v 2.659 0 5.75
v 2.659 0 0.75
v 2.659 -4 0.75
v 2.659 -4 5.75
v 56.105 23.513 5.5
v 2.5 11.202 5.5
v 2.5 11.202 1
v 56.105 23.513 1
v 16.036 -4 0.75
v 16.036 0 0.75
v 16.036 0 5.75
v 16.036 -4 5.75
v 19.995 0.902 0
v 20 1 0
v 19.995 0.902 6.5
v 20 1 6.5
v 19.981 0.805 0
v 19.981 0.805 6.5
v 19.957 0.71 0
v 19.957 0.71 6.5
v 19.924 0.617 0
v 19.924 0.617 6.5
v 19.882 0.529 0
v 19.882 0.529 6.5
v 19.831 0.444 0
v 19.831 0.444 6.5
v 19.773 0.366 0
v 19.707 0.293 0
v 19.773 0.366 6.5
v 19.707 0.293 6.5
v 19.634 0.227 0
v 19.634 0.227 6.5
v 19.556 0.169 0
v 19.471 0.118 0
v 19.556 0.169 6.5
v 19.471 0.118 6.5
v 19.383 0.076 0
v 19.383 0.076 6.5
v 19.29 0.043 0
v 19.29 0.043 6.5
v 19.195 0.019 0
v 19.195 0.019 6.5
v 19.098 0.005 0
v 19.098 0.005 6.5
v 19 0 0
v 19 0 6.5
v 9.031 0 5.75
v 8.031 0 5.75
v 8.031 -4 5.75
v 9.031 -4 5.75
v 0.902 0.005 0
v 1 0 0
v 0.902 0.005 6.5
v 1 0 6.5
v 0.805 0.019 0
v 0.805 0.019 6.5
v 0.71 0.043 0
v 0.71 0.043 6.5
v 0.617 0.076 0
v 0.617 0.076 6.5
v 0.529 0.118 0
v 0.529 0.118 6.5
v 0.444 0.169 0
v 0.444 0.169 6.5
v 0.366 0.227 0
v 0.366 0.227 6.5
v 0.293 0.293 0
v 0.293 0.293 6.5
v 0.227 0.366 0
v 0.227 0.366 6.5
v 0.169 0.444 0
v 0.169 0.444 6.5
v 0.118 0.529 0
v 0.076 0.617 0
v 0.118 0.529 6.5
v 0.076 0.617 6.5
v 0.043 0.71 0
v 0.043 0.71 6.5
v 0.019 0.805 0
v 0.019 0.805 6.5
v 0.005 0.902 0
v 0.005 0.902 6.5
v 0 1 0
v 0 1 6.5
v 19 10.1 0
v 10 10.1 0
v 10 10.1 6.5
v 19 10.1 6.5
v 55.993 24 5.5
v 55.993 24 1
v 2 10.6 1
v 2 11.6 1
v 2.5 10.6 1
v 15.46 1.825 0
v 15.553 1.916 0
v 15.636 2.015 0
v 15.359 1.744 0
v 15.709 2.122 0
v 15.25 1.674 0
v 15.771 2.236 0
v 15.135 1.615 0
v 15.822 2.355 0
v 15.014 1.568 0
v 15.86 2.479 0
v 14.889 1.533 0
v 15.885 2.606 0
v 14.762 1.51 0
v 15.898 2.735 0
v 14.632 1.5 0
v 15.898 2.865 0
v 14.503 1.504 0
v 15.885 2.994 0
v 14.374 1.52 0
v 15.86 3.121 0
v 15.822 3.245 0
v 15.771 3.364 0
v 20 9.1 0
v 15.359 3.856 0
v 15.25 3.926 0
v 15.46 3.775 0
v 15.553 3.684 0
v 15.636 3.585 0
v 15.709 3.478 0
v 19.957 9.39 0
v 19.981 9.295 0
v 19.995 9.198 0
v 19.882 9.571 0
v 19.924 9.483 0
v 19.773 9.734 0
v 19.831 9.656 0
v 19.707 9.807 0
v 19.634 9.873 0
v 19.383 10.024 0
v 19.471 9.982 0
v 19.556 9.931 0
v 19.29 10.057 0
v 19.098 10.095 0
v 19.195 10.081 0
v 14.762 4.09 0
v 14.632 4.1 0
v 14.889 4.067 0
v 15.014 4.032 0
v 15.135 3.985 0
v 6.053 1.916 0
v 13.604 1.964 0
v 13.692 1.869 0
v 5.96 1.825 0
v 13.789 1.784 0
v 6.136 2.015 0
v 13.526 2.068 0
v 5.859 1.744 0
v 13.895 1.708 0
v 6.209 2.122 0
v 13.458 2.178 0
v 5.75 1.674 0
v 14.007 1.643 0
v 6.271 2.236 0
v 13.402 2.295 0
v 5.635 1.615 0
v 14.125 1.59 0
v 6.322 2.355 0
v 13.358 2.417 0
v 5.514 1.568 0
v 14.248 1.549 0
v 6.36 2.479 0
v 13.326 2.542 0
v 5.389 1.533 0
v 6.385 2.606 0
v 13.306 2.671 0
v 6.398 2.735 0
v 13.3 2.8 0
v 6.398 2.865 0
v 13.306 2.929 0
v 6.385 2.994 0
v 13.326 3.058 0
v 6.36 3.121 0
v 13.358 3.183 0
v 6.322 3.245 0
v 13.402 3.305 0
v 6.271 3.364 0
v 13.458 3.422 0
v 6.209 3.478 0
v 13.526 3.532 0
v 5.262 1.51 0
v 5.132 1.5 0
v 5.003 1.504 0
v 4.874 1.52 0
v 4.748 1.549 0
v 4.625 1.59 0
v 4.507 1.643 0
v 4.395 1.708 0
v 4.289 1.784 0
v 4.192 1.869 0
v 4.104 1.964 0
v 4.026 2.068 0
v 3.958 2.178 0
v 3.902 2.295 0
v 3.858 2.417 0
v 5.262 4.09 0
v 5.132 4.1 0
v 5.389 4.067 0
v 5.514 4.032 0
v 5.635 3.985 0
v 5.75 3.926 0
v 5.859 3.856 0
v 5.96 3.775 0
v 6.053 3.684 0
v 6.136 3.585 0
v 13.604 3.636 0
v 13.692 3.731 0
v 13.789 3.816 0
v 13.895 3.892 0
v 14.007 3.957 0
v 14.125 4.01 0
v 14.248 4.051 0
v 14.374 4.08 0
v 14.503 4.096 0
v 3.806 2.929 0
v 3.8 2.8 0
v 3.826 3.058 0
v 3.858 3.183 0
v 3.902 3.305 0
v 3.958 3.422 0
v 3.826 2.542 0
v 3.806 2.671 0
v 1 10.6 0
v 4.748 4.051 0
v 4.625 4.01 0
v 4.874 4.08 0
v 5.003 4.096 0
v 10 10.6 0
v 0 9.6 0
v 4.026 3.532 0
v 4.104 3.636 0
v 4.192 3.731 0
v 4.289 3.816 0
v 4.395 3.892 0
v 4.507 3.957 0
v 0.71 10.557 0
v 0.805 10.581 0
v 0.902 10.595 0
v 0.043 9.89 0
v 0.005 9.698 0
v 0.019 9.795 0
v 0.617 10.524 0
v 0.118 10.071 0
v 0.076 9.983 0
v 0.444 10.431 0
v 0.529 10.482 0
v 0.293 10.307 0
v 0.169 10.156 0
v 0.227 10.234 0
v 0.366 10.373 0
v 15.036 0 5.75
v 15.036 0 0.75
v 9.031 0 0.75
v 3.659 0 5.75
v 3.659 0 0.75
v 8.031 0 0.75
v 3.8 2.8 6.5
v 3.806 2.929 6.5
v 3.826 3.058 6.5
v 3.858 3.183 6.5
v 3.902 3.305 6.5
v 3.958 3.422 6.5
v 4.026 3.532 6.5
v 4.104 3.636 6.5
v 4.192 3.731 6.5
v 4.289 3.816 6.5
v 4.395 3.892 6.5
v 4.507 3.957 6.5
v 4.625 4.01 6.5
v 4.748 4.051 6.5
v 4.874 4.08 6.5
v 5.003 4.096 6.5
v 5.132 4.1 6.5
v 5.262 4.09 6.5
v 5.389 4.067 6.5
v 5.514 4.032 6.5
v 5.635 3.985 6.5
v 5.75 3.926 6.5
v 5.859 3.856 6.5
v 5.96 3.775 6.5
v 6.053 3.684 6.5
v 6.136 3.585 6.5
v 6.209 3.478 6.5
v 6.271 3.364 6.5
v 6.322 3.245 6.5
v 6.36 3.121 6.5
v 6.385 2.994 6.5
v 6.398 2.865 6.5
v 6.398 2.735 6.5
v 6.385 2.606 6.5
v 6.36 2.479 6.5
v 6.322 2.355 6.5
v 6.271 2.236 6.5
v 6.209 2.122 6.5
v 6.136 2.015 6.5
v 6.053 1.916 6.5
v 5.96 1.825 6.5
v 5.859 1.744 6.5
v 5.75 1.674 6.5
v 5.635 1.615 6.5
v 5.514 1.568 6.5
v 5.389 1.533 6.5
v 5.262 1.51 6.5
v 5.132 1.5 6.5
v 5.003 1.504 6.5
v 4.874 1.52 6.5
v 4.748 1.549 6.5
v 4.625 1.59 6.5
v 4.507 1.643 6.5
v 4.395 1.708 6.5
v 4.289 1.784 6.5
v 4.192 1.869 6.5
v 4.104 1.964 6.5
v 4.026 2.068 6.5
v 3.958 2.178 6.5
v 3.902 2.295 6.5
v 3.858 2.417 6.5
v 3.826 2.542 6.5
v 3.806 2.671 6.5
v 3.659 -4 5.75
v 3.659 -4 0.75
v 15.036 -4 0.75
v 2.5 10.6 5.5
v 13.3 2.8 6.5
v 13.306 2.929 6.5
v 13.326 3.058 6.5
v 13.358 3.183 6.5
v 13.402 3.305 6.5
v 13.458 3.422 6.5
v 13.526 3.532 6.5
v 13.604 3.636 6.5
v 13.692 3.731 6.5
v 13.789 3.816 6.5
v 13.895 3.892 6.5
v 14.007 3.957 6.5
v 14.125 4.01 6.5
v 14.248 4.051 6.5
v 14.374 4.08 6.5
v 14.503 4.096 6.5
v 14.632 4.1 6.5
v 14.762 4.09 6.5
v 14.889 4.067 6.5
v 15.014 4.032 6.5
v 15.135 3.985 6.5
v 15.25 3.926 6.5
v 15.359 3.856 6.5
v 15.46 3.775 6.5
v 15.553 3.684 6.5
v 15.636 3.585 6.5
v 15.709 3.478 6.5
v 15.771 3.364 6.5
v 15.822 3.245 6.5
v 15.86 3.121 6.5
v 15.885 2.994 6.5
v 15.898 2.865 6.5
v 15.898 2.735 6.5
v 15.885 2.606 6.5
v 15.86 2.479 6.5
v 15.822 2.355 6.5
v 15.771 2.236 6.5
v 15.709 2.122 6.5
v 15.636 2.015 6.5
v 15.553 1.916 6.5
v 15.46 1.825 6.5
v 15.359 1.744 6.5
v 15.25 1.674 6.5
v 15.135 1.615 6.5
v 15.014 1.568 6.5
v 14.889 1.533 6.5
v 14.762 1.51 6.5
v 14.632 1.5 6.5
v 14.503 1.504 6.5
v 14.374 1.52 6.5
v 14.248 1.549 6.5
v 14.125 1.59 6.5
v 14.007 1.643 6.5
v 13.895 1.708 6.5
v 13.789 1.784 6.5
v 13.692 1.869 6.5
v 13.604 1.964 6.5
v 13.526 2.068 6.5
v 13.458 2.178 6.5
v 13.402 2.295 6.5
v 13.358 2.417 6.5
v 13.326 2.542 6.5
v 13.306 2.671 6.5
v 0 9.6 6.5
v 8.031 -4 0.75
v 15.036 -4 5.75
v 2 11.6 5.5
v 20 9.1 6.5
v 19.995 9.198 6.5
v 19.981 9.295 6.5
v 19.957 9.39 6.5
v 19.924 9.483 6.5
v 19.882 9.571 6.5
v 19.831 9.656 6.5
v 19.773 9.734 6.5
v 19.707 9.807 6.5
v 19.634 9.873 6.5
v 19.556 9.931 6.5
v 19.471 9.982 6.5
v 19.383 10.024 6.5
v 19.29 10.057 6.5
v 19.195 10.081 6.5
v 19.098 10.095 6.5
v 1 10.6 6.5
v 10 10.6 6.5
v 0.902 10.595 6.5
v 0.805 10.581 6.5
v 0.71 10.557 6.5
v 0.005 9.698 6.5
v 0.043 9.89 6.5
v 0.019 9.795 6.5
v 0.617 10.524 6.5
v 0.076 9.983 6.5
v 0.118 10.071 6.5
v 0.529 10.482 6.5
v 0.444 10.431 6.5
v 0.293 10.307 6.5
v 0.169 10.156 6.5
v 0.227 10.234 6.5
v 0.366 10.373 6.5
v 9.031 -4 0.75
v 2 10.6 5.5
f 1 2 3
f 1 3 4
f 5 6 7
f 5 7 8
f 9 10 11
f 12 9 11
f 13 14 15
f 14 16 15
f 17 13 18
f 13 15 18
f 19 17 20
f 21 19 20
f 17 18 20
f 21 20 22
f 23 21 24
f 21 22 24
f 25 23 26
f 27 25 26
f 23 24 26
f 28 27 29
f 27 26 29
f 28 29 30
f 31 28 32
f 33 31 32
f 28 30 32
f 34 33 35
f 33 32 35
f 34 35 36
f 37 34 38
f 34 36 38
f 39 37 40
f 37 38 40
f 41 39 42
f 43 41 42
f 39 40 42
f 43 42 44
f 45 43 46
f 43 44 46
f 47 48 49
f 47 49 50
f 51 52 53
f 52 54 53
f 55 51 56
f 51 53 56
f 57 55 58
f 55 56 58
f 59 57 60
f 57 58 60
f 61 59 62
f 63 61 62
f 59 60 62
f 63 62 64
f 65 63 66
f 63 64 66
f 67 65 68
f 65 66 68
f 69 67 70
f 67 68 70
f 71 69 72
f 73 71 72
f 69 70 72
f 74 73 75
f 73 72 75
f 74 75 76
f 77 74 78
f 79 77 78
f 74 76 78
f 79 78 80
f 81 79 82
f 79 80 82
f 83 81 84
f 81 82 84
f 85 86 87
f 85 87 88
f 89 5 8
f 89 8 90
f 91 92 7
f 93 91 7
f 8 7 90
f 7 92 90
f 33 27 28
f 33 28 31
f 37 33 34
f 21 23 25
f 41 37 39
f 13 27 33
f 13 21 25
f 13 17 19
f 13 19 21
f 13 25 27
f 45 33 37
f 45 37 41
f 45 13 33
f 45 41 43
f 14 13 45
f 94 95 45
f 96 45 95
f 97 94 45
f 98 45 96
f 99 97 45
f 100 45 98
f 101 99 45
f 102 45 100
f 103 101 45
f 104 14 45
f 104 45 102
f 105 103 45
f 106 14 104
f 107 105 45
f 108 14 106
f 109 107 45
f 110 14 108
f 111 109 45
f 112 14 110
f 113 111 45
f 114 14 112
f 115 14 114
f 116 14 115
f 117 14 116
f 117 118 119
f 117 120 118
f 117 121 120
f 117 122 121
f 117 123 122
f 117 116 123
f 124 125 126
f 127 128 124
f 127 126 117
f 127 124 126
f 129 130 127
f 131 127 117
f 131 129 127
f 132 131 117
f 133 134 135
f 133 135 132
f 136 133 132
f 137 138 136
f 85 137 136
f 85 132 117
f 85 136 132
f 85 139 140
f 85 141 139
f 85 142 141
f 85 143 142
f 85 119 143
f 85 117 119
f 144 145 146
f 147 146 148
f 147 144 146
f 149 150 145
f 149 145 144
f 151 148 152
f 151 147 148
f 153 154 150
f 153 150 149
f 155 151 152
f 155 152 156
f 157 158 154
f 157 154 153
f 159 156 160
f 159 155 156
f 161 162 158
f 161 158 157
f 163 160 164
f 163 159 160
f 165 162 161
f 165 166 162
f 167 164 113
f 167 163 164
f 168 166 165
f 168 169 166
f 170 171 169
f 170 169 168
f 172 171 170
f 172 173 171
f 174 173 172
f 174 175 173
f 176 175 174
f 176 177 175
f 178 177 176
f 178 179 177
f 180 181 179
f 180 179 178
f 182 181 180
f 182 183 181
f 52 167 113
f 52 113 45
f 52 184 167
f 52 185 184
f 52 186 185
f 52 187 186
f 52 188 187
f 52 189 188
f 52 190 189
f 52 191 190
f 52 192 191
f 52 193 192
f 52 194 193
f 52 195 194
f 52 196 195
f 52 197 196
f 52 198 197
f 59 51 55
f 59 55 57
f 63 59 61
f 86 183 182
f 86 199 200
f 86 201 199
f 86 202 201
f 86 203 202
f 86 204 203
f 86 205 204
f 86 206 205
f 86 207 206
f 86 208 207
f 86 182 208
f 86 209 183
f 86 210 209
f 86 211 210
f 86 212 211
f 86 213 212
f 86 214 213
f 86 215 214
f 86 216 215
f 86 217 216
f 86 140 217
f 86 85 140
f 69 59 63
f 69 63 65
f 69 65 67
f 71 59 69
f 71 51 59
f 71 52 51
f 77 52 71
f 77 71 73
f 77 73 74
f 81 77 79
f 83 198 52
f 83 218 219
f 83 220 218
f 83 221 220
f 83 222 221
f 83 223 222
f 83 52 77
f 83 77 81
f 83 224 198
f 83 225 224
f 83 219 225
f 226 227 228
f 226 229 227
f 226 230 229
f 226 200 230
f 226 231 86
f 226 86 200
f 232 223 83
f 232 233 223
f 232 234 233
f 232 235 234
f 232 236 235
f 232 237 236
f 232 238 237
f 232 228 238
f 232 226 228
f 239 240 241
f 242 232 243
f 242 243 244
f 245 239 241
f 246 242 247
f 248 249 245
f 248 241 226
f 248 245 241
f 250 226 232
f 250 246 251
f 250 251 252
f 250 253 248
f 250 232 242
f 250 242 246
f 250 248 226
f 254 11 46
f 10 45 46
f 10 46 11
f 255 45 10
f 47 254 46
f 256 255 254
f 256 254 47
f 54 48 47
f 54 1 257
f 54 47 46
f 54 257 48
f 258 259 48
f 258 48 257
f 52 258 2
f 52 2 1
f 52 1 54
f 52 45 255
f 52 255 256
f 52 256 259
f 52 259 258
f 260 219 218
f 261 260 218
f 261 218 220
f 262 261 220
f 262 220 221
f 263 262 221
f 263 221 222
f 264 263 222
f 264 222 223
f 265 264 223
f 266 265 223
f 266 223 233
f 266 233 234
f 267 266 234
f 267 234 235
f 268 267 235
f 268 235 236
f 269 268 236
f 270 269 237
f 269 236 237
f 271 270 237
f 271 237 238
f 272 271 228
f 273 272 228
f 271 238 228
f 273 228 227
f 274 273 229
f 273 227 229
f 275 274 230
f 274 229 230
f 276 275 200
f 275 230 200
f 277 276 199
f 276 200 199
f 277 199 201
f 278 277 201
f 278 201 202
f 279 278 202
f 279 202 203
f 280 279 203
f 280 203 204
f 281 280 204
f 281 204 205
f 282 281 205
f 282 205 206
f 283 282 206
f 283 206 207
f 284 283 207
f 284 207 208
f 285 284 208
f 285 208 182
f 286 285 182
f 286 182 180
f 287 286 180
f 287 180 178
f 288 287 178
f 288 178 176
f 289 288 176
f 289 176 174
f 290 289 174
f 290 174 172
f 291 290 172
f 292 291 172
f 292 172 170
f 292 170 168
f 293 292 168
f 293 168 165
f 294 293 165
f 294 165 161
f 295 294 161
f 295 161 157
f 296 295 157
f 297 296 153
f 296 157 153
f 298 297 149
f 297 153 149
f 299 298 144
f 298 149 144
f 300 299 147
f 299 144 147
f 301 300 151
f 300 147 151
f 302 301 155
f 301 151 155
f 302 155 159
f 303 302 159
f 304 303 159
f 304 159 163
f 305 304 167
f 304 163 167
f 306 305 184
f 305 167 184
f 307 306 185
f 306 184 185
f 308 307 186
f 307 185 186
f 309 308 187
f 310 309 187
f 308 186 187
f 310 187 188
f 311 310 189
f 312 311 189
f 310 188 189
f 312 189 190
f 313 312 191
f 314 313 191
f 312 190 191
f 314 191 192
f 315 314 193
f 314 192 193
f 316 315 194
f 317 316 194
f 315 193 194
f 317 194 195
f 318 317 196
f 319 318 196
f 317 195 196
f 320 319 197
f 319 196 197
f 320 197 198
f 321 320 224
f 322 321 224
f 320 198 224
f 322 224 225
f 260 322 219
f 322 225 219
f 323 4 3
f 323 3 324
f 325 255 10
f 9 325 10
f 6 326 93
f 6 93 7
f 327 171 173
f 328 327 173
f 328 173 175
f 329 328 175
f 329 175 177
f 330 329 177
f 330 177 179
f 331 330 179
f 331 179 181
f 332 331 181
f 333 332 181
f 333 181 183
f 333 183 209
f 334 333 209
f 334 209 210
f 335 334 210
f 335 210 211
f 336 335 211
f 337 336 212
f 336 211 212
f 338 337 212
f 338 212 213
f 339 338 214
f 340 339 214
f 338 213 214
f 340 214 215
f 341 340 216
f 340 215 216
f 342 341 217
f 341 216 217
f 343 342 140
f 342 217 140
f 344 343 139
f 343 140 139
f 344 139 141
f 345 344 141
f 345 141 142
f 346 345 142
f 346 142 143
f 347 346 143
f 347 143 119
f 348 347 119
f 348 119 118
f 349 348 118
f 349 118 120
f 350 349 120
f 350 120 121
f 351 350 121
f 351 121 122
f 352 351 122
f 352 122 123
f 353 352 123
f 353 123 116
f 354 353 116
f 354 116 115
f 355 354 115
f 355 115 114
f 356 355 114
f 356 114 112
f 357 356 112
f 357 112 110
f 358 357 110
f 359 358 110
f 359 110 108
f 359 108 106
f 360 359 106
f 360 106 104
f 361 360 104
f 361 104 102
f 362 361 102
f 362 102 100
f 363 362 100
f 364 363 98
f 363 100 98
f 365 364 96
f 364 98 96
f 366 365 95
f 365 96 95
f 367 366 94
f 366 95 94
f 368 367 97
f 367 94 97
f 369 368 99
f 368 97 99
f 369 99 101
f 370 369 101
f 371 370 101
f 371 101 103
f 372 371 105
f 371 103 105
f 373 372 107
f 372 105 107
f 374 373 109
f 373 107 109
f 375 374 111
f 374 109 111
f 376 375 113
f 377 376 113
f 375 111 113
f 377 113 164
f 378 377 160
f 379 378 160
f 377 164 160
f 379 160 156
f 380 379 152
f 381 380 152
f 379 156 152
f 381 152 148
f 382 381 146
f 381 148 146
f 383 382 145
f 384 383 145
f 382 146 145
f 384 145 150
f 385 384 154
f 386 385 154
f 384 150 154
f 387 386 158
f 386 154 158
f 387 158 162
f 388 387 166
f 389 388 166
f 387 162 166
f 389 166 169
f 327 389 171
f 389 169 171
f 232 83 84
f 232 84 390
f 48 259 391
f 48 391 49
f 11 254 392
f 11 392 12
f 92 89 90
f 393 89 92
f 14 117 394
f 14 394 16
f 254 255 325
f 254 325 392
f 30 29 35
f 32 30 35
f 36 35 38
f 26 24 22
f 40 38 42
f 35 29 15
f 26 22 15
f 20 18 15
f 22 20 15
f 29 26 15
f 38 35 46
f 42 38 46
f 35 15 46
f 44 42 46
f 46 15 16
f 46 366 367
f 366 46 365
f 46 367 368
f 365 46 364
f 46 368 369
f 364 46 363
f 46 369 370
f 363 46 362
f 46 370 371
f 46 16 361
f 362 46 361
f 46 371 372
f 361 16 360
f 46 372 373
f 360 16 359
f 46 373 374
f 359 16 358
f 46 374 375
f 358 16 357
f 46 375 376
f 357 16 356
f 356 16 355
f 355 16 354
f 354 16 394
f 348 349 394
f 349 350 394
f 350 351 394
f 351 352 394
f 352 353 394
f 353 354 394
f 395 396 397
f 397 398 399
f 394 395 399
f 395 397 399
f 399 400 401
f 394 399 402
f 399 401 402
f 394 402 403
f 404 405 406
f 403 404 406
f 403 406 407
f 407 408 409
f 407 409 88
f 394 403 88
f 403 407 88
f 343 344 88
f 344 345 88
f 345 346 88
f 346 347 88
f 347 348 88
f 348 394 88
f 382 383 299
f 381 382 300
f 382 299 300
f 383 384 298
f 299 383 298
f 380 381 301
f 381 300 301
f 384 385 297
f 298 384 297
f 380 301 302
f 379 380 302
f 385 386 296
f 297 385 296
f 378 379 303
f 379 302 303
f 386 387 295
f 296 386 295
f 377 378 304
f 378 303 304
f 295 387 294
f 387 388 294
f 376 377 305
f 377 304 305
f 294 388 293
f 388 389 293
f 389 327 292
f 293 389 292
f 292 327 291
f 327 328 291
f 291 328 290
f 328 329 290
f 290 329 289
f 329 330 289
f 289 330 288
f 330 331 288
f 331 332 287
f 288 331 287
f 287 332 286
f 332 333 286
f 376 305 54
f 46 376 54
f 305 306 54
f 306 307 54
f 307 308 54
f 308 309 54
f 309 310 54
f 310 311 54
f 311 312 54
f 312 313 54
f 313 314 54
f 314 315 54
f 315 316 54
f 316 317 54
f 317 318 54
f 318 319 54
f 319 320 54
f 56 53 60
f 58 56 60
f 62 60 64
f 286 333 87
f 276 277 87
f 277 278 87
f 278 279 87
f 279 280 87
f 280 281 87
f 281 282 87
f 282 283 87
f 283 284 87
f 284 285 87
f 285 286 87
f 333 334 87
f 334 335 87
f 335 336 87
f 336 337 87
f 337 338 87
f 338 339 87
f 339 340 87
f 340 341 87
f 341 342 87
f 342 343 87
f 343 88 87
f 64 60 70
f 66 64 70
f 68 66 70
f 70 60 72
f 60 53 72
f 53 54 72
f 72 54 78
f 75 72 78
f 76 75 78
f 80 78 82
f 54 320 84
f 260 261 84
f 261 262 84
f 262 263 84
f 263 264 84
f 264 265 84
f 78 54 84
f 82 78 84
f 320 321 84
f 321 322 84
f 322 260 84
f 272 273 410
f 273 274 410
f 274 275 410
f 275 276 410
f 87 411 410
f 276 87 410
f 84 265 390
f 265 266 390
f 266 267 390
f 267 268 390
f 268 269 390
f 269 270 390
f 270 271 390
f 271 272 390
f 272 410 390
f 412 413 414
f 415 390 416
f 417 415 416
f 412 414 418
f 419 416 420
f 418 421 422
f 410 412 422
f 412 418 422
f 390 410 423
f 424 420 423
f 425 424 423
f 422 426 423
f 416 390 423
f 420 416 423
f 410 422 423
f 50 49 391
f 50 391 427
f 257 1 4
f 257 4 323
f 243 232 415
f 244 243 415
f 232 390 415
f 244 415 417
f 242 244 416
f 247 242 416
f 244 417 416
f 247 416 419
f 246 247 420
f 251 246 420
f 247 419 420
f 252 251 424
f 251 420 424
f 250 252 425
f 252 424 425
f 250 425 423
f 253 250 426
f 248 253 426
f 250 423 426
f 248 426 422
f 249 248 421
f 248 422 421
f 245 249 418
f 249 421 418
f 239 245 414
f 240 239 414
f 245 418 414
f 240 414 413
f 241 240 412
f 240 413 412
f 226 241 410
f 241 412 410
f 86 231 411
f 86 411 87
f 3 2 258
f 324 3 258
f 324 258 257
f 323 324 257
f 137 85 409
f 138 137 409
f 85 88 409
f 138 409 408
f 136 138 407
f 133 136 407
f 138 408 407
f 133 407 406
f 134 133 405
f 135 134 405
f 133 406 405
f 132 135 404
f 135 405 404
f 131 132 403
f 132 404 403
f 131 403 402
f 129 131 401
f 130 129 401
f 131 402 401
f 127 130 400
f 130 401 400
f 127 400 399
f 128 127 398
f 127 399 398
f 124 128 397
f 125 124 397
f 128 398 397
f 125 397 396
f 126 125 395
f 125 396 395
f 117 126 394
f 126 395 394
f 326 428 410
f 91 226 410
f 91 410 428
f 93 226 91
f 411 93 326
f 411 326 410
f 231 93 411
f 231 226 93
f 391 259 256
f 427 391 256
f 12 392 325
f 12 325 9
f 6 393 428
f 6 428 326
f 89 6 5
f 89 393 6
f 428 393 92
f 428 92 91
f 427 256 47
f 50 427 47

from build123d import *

# Parameters (mm, degrees)
BOSS_EXTRUDE1_DEPTH  = 6.5
FILLET1_R            = 1
M2_CLEARANCE_HOLE1_D = 2.6
BOSS_EXTRUDE2_START  = -1
BOSS_EXTRUDE2_DEPTH  = 4.5
SKETCH6_W            = 1
SKETCH6_H            = 5
BOSS_EXTRUDE3_DEPTH  = 4


with BuildPart() as part:
    # Sketch1 → Boss-Extrude1 (new body)
    with BuildSketch(Plane.XY):
        Polygon((10, 10.6), (10, 10.1), (20, 10.1), (20, 0), (0, 0), (0, 10.6), align=None)
    extrude(amount=BOSS_EXTRUDE1_DEPTH)

    # Fillet1
    fillet1_edges = [part.edges().sort_by_distance(p)[0] for p in [
        (0, 10.6, 3.25),
        (20, 10.1, 3.25),
        (20, 0, 3.25),
        (0, 0, 3.25),
    ]]
    fillet(fillet1_edges, radius=FILLET1_R)

    # M2 Clearance Hole1 (through all)
    with Locations(Plane.XY.offset(6.5)):
        with Locations((5.1, 2.8), (14.6, 2.8)):
            Hole(M2_CLEARANCE_HOLE1_D / 2)

    # Sketch5 → Boss-Extrude2 (add)
    with BuildSketch(Plane.XY.offset(6.5).offset(BOSS_EXTRUDE2_START)):
        Polygon((2, 11.6), (2, 10.6), (2.5, 10.6), (2.5, 11.201813956), (56.104500003, 23.512686364), (55.992582981, 24), align=None)
    extrude(amount=-BOSS_EXTRUDE2_DEPTH)

    # Sketch6 → Boss-Extrude3 (add)
    with BuildSketch(Plane.XZ):
        with Locations((3.159009098, 3.25)):
            Rectangle(SKETCH6_W, SKETCH6_H)
        with Locations((8.531370471, 3.25)):
            Rectangle(SKETCH6_W, SKETCH6_H)
        with Locations((15.53592061, 3.25)):
            Rectangle(SKETCH6_W, SKETCH6_H)
    extrude(amount=BOSS_EXTRUDE3_DEPTH)


solid = part.part
